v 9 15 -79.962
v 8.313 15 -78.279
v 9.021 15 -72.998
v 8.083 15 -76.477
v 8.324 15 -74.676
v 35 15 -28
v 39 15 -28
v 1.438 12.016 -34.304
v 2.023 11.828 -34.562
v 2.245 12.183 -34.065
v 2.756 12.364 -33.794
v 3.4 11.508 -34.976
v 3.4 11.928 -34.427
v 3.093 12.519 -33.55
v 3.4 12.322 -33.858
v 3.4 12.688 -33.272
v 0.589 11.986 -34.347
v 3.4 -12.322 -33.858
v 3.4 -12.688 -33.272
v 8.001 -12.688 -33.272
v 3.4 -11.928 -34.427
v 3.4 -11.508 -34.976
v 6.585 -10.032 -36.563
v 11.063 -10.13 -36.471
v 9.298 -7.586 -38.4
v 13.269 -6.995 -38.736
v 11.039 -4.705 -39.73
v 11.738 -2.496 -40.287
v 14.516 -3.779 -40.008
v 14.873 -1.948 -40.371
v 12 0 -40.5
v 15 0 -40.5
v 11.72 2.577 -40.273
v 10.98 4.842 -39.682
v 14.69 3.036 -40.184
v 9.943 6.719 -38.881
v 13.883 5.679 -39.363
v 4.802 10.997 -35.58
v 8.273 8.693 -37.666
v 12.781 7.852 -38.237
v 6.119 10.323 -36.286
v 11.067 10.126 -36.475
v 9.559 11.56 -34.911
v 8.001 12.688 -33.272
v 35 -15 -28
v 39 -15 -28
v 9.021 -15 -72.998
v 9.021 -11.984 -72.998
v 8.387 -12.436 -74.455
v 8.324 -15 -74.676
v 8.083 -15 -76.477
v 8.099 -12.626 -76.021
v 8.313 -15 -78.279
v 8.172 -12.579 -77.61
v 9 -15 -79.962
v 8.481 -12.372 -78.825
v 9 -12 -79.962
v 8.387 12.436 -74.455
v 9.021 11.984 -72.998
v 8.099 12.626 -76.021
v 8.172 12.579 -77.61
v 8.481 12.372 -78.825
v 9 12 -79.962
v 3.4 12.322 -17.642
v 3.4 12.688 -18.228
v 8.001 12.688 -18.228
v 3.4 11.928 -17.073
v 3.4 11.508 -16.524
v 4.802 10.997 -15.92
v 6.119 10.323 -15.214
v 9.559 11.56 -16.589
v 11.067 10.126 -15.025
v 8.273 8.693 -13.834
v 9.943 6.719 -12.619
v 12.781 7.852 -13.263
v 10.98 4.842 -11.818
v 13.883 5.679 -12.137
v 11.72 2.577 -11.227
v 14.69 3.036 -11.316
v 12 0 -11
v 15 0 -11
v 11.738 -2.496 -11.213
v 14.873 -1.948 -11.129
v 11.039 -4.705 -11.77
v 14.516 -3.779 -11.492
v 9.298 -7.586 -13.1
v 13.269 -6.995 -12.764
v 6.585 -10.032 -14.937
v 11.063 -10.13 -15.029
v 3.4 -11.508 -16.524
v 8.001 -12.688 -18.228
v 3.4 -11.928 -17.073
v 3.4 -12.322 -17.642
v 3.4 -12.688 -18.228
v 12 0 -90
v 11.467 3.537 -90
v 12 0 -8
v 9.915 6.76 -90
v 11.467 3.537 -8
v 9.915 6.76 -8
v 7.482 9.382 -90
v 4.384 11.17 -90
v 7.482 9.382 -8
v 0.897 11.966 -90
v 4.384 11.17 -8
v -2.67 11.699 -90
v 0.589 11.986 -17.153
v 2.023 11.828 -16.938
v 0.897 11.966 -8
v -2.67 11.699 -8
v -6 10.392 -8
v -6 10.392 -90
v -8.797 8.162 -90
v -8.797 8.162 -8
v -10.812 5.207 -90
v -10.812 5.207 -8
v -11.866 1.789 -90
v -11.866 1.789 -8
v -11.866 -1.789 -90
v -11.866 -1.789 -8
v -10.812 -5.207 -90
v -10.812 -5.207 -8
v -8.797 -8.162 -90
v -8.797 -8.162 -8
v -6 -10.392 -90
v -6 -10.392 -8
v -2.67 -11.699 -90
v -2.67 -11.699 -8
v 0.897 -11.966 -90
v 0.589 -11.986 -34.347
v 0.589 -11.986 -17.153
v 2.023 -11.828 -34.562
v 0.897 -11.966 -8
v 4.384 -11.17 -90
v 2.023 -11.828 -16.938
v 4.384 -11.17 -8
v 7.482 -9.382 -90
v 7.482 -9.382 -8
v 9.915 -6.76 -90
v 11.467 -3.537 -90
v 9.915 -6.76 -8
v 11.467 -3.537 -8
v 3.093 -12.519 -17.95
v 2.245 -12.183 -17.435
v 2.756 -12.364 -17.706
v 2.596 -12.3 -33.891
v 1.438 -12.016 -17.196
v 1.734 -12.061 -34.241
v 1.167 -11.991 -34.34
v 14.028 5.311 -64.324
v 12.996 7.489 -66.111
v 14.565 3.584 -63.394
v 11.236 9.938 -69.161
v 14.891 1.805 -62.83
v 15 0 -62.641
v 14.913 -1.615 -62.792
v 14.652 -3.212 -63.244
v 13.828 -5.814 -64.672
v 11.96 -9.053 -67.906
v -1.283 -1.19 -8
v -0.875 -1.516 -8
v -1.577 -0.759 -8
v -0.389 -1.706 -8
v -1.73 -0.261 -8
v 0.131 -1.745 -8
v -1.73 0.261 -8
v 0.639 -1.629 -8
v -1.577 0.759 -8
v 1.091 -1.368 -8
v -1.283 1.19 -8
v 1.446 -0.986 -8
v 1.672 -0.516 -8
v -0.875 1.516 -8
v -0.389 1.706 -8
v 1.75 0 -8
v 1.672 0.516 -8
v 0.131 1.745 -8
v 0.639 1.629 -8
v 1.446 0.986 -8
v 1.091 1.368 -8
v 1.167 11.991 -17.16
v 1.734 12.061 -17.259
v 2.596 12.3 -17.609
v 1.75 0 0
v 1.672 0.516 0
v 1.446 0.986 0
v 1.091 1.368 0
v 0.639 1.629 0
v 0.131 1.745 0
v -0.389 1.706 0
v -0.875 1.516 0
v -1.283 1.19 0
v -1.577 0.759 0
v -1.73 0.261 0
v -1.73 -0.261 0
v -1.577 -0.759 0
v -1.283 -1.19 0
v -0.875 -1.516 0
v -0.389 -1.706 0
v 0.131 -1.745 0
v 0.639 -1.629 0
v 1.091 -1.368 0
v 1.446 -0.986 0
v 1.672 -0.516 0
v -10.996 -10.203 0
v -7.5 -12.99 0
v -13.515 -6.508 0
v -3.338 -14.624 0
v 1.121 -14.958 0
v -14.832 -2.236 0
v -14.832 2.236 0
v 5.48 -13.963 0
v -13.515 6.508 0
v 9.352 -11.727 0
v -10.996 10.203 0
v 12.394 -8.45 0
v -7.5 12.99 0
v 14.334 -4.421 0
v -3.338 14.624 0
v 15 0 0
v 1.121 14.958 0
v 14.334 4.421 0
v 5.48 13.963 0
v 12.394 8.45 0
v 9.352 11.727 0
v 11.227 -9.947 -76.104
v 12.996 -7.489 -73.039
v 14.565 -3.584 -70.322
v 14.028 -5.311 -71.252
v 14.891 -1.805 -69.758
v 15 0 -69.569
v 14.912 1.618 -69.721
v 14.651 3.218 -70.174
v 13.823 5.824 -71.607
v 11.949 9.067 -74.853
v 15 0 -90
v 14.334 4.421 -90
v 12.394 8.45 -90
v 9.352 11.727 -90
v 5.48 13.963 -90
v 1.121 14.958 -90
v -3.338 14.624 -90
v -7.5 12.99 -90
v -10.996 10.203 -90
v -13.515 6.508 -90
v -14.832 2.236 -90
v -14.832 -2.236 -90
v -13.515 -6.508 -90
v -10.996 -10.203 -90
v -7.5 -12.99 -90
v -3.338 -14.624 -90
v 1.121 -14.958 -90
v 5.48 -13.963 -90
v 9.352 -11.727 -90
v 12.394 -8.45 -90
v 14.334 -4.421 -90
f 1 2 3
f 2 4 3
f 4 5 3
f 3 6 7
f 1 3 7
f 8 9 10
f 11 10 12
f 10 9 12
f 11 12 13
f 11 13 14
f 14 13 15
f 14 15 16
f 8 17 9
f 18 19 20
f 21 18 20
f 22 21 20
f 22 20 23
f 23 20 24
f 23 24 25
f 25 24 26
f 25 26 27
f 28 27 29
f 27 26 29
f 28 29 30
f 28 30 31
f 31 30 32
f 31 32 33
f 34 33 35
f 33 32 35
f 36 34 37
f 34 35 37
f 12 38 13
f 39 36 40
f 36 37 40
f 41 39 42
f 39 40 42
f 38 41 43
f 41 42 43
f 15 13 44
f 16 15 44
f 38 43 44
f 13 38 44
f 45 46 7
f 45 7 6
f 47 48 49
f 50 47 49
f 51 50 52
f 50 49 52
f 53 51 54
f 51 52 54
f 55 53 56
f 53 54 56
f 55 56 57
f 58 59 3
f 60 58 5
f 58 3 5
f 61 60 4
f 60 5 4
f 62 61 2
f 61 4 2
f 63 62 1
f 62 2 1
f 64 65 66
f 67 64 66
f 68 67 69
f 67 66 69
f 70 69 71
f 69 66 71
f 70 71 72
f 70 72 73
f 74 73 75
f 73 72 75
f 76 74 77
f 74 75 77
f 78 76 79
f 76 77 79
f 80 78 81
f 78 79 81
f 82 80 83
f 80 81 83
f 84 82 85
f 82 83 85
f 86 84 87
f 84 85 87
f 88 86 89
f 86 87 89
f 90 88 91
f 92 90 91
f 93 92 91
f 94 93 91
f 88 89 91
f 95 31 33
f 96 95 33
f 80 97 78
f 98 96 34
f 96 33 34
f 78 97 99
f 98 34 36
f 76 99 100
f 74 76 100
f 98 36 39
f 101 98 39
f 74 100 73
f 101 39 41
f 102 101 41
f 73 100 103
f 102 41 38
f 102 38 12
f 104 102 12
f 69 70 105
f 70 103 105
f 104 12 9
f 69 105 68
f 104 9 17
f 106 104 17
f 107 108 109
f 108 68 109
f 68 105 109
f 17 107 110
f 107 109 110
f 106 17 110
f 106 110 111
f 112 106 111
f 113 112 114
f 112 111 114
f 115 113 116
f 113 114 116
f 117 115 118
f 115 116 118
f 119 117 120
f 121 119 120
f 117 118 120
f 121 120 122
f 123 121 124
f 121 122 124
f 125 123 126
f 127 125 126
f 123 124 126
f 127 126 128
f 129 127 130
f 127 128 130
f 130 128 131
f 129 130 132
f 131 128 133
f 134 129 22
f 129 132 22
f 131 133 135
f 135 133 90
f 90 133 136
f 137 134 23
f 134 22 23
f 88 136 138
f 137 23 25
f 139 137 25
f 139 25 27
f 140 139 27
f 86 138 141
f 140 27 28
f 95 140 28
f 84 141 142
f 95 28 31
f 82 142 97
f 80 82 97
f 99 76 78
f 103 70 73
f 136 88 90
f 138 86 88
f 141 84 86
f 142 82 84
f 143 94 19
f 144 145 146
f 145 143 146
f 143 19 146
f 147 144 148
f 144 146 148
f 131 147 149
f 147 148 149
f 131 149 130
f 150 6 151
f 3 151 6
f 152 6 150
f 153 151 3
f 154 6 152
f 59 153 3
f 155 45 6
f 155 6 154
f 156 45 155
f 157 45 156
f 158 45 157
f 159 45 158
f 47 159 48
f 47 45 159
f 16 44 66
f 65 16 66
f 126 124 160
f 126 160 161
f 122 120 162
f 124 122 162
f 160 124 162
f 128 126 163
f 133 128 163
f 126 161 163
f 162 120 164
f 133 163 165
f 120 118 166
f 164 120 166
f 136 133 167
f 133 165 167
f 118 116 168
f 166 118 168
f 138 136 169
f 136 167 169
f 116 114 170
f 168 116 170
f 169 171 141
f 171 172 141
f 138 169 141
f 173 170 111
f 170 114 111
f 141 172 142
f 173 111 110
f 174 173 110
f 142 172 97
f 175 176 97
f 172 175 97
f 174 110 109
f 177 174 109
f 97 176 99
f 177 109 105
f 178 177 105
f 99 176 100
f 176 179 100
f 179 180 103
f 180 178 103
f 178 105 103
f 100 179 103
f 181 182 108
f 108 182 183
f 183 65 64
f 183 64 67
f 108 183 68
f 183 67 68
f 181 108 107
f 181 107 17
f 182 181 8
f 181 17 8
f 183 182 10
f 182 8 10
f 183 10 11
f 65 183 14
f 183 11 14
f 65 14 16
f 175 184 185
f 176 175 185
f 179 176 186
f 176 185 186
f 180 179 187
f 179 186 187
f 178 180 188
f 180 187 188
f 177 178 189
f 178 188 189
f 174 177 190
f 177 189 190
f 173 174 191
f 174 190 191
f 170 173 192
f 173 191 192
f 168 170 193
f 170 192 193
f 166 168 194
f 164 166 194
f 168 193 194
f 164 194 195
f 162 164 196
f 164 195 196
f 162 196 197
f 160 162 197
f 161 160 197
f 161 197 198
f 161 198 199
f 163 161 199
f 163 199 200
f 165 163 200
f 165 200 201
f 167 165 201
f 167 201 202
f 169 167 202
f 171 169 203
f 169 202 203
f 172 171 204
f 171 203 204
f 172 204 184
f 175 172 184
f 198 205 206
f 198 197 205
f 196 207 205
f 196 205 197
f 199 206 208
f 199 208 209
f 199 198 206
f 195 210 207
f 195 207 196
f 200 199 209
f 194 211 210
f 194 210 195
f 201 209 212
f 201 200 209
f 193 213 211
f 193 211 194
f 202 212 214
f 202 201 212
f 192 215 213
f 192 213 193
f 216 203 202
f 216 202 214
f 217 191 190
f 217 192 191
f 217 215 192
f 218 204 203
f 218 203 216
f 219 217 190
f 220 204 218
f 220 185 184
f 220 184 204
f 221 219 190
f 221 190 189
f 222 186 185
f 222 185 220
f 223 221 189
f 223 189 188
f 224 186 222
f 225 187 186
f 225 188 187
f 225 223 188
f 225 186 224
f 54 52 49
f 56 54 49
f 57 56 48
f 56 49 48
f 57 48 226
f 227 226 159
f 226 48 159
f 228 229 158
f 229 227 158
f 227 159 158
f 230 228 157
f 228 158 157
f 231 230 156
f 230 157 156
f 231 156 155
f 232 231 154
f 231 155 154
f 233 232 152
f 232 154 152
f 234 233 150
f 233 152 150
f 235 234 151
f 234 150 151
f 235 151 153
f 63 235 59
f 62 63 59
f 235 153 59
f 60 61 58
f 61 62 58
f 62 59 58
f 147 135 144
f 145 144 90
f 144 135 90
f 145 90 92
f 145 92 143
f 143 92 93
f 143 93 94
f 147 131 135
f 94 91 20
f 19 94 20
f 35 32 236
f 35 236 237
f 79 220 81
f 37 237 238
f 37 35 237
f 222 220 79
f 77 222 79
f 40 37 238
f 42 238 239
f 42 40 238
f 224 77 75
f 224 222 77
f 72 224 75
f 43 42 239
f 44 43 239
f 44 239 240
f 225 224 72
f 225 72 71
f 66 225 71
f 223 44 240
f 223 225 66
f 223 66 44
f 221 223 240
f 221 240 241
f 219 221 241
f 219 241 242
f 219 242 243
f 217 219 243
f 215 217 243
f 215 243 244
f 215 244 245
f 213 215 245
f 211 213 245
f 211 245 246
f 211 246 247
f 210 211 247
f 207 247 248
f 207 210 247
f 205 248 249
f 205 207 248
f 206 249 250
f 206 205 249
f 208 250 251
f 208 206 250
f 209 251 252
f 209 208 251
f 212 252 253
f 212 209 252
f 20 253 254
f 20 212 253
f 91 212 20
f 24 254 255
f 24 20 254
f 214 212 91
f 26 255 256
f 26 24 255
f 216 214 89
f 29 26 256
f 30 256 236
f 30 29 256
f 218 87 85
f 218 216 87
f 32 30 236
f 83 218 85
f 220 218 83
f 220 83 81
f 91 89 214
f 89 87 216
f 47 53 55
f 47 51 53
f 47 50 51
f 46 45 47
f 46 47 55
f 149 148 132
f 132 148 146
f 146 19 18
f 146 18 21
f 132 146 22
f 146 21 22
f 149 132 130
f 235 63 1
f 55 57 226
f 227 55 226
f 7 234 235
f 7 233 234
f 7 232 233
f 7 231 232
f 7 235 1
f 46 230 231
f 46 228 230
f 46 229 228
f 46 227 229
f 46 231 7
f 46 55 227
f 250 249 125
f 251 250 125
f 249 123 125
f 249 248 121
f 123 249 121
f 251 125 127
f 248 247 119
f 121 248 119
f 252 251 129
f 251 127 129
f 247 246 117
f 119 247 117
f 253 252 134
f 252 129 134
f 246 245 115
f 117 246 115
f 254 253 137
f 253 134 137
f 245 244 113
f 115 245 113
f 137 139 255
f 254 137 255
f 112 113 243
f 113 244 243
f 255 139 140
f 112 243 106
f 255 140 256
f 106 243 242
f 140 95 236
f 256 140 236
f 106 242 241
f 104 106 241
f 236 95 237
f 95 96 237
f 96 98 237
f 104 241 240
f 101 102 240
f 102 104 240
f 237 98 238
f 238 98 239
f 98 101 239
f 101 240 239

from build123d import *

# Parameters (mm, degrees)
F0_R         = 15
F0_R_2       = 12
F1_DEPTH     = 90
F0_R_3       = 1.75
F2_DEPTH     = 8
F5_DEPTH     = 11.6
F6_T4_DEPTH  = 32.7089830992
F6_S5_R      = 14.75
F6_T6_DEPTH  = 18
F6_T10_DEPTH = 32.7089830992
F6_S11_R     = 14.75
F6_T12_DEPTH = 18
F9_DEPTH     = 30
F10_T1_DEPTH = 70.2065483844
F11_DEPTH    = 103.2


# Not quite as in the source:
# - a fillet or chamfer that OpenCascade refuses, or shapes differently, is made with other operations: its cross-section is extruded or revolved along the edge and cut away or added


with BuildPart() as f1:
    # F0 (on Top) → F1 (new body)
    with BuildSketch(Plane.XY):
        Circle(F0_R)
        Circle(F0_R_2, mode=Mode.SUBTRACT)
    extrude(amount=-F1_DEPTH)

    # F0 (on Top) → F2 (join)
    with BuildSketch(Plane.XY):
        Circle(F0_R_2)
        Circle(F0_R_3, mode=Mode.SUBTRACT)
    extrude(amount=-F2_DEPTH)

    # F4 (on offset) → F5 (cut)
    with BuildSketch(Plane.YZ.offset(15)):
        with BuildLine():
            Line((12.688, -33.271778779), (12.688, -18.228221221))
            ThreePointArc((12.688, -18.228221221), (0, -11), (-12.688, -18.228221221))
            Line((-12.688, -18.228221221), (-12.688, -33.271778779))
            ThreePointArc((-12.688, -33.271778779), (0, -40.5), (12.688, -33.271778779))
        make_face()
    extrude(amount=-F5_DEPTH, mode=Mode.SUBTRACT)

    # F6: fillet of radius 5 on 2 edges, made by hand


with BuildPart() as f6_tool2:
    # F6_s3 → F6_t4 (new body)
    with BuildSketch(Plane.XY.offset(-42.1044915496)):
        with BuildLine():
            ThreePointArc((3.4, -12.688), (2.0464541168, -12.1286761902), (0.588907604, -11.9855407819))
            ThreePointArc((0.588907604, -11.9855407819), (2.0086800902, -11.8306890879), (3.4, -11.5082579047))
            Line((3.4, -11.5082579047), (3.4, -12.688))
        make_face()
    extrude(amount=F6_T4_DEPTH)

    # F6_s5 → F6_t6 (intersect, symmetric)
    with BuildSketch(Plane.YZ.offset(2)):
        with Locations((0, -25.75)):
            Circle(F6_S5_R)
    extrude(amount=F6_T6_DEPTH, both=True, mode=Mode.INTERSECT)


with BuildPart() as f1_1:
    add(f1.part)

    # F6_t1: cut F6_tool2
    add(f6_tool2.part, mode=Mode.SUBTRACT)


with BuildPart() as f6_tool8:
    # F6_s9 → F6_t10 (new body)
    with BuildSketch(Plane.XY.offset(-42.1044915496)):
        with BuildLine():
            ThreePointArc((0.588907604, 11.9855407819), (2.0464541168, 12.1286761902), (3.4, 12.688))
            Line((3.4, 12.688), (3.4, 11.5082579047))
            ThreePointArc((3.4, 11.5082579047), (2.0086800902, 11.8306890879), (0.588907604, 11.9855407819))
        make_face()
    extrude(amount=F6_T10_DEPTH)

    # F6_s11 → F6_t12 (intersect, symmetric)
    with BuildSketch(Plane.YZ.offset(2)):
        with Locations((0, -25.75)):
            Circle(F6_S11_R)
    extrude(amount=F6_T12_DEPTH, both=True, mode=Mode.INTERSECT)


with BuildPart() as f1_2:
    add(f1_1.part)

    # F6_t7: cut F6_tool8
    add(f6_tool8.part, mode=Mode.SUBTRACT)


with BuildPart() as f9:
    # F8 (on offset) → F9 (new body)
    with BuildSketch(Plane.XZ.offset(15)):
        Polygon((9, -79.9615242271), (39, -28), (35, -28), (5, -79.9615242271), align=None)
    extrude(amount=-F9_DEPTH)

    # F10: fillet of radius 7 on 1 edges, made by hand

    # F10_s2 → F10_t1 (cut)
    with BuildSketch(Plane.XZ.offset(-35.1032741922)):
        with BuildLine():
            ThreePointArc((9.0206548384, -72.9975457672), (8.0828634538, -76.4767841818), (9, -79.9615242271))
            Line((9, -79.9615242271), (5, -79.9615242271))
            Line((5, -79.9615242271), (9.0206548384, -72.9975457672))
        make_face()
    extrude(amount=F10_T1_DEPTH, mode=Mode.SUBTRACT)

    # F0 (on Top) → F11 (cut)
    with BuildSketch(Plane.XY):
        Circle(F0_R)
        Circle(F0_R_2, mode=Mode.SUBTRACT)
        Circle(F0_R_2)
        Circle(F0_R_3, mode=Mode.SUBTRACT)
    extrude(amount=-F11_DEPTH, mode=Mode.SUBTRACT)


solid = Compound([f1_2.part, f9.part])
